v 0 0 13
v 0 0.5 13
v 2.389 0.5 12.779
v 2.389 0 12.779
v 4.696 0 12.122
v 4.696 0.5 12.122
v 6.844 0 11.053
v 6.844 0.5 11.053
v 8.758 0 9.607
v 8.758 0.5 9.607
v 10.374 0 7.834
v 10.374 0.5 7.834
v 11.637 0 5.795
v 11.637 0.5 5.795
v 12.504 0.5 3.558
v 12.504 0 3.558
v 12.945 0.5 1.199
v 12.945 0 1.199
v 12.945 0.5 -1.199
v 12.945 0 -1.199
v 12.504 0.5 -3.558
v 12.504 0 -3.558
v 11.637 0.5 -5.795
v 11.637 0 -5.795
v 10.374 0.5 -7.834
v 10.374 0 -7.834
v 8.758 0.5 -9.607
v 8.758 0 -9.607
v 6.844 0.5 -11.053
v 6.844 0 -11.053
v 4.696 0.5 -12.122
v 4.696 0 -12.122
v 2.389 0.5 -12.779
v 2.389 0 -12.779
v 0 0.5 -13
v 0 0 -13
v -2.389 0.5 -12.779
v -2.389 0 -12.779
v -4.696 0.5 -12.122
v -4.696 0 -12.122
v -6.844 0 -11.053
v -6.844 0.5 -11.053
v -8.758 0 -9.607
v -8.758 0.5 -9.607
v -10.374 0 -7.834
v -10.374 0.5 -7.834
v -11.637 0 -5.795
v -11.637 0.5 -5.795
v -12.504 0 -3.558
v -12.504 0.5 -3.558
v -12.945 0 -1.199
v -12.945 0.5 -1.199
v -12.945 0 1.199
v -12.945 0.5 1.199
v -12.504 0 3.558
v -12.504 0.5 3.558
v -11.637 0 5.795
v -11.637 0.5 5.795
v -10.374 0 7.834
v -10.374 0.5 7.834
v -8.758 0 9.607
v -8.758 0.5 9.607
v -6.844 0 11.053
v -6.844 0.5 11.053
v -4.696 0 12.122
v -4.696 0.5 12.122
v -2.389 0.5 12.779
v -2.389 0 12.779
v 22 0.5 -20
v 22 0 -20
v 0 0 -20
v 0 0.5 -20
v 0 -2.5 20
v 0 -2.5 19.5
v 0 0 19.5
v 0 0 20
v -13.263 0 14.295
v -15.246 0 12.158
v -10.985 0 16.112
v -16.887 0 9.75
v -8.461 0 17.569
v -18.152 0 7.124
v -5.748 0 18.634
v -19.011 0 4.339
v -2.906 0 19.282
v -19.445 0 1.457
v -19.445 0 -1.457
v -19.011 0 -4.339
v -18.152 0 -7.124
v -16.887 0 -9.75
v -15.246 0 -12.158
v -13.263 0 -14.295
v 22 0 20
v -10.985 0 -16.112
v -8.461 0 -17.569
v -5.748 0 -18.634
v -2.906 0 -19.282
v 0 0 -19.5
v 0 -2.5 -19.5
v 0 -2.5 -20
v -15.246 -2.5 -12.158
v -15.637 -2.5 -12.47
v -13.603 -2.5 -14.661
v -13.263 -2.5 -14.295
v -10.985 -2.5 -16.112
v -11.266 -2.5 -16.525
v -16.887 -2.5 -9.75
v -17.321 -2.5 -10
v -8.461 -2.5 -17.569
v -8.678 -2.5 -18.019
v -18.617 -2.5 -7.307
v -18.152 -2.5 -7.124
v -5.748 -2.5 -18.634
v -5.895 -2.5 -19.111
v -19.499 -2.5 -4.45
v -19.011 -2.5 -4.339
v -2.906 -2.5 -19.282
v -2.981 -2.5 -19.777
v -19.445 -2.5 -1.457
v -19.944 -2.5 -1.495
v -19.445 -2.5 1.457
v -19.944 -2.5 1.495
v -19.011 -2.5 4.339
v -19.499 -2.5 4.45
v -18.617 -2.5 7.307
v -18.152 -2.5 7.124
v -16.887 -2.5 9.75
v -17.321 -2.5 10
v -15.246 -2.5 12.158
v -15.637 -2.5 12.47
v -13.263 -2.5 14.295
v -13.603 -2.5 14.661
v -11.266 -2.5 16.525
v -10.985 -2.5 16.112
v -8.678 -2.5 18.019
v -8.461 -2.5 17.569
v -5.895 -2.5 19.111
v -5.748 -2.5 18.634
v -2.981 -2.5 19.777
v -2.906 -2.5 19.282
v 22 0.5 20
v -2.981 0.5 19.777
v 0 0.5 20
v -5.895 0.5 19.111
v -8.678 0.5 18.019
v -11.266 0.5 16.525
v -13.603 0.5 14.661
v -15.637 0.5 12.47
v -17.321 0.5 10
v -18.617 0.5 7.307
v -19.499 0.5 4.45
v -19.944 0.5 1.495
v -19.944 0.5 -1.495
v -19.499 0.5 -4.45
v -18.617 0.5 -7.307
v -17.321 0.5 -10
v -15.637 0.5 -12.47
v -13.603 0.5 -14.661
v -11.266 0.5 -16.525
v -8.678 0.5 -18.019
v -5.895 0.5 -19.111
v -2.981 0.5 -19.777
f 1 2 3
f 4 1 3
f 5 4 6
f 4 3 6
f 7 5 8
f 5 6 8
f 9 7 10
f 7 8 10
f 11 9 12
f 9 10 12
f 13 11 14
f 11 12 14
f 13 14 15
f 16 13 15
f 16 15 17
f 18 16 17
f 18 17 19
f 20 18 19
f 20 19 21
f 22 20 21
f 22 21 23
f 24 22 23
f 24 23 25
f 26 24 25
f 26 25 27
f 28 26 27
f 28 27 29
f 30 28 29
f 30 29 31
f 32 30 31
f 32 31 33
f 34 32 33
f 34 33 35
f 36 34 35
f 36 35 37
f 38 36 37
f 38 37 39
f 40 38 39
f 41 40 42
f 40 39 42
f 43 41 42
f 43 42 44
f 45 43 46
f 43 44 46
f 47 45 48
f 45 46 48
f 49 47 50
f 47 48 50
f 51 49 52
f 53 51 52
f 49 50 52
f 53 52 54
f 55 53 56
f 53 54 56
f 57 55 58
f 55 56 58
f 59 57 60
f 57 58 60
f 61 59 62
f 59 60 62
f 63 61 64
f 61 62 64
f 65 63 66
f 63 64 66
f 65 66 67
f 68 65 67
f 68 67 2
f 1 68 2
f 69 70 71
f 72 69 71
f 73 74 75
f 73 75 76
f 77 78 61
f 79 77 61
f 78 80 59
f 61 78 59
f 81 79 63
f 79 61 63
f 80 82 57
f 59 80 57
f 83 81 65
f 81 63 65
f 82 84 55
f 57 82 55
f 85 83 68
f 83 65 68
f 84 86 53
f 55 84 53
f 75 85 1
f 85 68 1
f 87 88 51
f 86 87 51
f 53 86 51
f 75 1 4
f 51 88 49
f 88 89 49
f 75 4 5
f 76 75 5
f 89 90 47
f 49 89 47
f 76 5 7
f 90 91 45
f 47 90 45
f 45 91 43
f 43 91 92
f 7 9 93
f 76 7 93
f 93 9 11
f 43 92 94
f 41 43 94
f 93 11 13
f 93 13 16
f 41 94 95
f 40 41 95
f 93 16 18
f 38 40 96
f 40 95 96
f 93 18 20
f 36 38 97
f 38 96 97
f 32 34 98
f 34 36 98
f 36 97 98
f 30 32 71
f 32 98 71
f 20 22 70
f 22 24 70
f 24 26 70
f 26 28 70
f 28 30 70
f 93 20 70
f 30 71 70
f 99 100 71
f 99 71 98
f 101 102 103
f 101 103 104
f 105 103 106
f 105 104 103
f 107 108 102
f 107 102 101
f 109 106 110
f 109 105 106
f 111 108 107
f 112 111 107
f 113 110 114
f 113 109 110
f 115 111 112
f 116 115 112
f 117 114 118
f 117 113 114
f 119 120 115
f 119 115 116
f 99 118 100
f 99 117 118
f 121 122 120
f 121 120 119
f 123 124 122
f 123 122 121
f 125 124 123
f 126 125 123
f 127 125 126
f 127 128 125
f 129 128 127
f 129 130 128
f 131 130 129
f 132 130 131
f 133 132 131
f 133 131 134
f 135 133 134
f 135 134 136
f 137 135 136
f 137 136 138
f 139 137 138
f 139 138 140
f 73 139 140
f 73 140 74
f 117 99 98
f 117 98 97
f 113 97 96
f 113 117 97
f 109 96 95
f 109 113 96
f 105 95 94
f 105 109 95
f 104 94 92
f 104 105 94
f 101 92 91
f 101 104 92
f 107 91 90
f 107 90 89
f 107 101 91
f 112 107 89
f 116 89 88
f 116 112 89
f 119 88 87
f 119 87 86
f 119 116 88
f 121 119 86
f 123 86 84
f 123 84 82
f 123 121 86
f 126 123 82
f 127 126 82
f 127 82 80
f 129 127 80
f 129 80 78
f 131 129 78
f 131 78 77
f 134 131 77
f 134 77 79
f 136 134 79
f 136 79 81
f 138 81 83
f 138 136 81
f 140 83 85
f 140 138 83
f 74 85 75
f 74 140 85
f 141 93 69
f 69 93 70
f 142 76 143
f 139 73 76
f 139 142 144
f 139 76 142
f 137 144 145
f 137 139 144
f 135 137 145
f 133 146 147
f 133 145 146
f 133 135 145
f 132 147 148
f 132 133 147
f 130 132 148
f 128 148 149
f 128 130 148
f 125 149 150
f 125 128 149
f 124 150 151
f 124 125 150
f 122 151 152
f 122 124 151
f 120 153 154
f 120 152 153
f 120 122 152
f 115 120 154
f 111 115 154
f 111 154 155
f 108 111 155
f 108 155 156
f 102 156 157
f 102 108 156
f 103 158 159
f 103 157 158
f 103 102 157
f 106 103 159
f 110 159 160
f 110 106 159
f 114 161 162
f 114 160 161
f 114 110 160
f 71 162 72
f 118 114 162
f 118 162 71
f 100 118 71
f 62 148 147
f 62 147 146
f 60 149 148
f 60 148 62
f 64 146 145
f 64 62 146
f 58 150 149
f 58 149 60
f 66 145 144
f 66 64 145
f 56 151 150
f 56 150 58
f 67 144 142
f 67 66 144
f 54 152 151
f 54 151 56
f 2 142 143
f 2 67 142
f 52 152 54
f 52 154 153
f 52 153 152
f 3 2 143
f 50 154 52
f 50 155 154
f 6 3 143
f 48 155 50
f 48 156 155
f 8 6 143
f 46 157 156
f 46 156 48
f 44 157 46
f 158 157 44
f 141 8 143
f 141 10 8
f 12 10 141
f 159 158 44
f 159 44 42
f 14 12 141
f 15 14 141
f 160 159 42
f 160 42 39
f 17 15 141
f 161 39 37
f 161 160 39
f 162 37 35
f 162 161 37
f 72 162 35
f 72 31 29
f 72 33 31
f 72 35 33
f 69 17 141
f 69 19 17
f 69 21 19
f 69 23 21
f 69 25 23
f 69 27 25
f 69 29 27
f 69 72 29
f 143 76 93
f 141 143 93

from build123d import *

# Parameters (mm, degrees)
EXTRUDE_1_DEPTH     = 0.5
EXTRUDE_START       = 2.5
EXTRUDE_2_DEPTH     = 2.5
SKETCH_3_R          = 13
CUT_EXTRUDE_1_DEPTH = 30.883105595


with BuildPart() as part:
    # 草图1 → 凸台-拉伸1 (new body)
    with BuildSketch(Plane(origin=(0, 0, 0), x_dir=(1, 0, 0), z_dir=(0, 1, 0))):
        with BuildLine():
            ThreePointArc((20, 0), (14.142135624, 14.142135624), (0, 20))
            Line((0, 20), (0, -20))
            ThreePointArc((0, -20), (14.142135624, -14.142135624), (20, 0))
        make_face()
        with BuildLine():
            Line((0, -20), (0, 20))
            ThreePointArc((0, 20), (-20, 0), (0, -20))
        make_face()
        with BuildLine():
            Line((22, 20), (0, 20))
            ThreePointArc((0, 20), (14.142135624, 14.142135624), (20, 0))
            ThreePointArc((20, 0), (14.142135624, -14.142135624), (0, -20))
            Line((0, -20), (22, -20))
            Line((22, -20), (22, 20))
        make_face()
    extrude(amount=EXTRUDE_1_DEPTH)

    # 草图2 → 凸台-拉伸2 (add)
    with BuildSketch(Plane.XZ.offset(EXTRUDE_START)):
        with BuildLine():
            Line((0, 19.5), (0, 20))
            ThreePointArc((0, 20), (-20, 0), (0, -20))
            Line((0, -20), (0, -19.5))
            ThreePointArc((0, -19.5), (-19.5, 0), (0, 19.5))
        make_face()
    extrude(amount=-EXTRUDE_2_DEPTH)

    # 草图3 → 切除-拉伸1 (cut, through all)
    with BuildSketch(Plane(origin=(0, 0.5, 0), x_dir=(1, 0, 0), z_dir=(0, 1, 0))):
        with Locations(Location((0, 0, 0), (0, 0, 270))):
            Circle(SKETCH_3_R)
    extrude(amount=-CUT_EXTRUDE_1_DEPTH, mode=Mode.SUBTRACT)


solid = part.part
